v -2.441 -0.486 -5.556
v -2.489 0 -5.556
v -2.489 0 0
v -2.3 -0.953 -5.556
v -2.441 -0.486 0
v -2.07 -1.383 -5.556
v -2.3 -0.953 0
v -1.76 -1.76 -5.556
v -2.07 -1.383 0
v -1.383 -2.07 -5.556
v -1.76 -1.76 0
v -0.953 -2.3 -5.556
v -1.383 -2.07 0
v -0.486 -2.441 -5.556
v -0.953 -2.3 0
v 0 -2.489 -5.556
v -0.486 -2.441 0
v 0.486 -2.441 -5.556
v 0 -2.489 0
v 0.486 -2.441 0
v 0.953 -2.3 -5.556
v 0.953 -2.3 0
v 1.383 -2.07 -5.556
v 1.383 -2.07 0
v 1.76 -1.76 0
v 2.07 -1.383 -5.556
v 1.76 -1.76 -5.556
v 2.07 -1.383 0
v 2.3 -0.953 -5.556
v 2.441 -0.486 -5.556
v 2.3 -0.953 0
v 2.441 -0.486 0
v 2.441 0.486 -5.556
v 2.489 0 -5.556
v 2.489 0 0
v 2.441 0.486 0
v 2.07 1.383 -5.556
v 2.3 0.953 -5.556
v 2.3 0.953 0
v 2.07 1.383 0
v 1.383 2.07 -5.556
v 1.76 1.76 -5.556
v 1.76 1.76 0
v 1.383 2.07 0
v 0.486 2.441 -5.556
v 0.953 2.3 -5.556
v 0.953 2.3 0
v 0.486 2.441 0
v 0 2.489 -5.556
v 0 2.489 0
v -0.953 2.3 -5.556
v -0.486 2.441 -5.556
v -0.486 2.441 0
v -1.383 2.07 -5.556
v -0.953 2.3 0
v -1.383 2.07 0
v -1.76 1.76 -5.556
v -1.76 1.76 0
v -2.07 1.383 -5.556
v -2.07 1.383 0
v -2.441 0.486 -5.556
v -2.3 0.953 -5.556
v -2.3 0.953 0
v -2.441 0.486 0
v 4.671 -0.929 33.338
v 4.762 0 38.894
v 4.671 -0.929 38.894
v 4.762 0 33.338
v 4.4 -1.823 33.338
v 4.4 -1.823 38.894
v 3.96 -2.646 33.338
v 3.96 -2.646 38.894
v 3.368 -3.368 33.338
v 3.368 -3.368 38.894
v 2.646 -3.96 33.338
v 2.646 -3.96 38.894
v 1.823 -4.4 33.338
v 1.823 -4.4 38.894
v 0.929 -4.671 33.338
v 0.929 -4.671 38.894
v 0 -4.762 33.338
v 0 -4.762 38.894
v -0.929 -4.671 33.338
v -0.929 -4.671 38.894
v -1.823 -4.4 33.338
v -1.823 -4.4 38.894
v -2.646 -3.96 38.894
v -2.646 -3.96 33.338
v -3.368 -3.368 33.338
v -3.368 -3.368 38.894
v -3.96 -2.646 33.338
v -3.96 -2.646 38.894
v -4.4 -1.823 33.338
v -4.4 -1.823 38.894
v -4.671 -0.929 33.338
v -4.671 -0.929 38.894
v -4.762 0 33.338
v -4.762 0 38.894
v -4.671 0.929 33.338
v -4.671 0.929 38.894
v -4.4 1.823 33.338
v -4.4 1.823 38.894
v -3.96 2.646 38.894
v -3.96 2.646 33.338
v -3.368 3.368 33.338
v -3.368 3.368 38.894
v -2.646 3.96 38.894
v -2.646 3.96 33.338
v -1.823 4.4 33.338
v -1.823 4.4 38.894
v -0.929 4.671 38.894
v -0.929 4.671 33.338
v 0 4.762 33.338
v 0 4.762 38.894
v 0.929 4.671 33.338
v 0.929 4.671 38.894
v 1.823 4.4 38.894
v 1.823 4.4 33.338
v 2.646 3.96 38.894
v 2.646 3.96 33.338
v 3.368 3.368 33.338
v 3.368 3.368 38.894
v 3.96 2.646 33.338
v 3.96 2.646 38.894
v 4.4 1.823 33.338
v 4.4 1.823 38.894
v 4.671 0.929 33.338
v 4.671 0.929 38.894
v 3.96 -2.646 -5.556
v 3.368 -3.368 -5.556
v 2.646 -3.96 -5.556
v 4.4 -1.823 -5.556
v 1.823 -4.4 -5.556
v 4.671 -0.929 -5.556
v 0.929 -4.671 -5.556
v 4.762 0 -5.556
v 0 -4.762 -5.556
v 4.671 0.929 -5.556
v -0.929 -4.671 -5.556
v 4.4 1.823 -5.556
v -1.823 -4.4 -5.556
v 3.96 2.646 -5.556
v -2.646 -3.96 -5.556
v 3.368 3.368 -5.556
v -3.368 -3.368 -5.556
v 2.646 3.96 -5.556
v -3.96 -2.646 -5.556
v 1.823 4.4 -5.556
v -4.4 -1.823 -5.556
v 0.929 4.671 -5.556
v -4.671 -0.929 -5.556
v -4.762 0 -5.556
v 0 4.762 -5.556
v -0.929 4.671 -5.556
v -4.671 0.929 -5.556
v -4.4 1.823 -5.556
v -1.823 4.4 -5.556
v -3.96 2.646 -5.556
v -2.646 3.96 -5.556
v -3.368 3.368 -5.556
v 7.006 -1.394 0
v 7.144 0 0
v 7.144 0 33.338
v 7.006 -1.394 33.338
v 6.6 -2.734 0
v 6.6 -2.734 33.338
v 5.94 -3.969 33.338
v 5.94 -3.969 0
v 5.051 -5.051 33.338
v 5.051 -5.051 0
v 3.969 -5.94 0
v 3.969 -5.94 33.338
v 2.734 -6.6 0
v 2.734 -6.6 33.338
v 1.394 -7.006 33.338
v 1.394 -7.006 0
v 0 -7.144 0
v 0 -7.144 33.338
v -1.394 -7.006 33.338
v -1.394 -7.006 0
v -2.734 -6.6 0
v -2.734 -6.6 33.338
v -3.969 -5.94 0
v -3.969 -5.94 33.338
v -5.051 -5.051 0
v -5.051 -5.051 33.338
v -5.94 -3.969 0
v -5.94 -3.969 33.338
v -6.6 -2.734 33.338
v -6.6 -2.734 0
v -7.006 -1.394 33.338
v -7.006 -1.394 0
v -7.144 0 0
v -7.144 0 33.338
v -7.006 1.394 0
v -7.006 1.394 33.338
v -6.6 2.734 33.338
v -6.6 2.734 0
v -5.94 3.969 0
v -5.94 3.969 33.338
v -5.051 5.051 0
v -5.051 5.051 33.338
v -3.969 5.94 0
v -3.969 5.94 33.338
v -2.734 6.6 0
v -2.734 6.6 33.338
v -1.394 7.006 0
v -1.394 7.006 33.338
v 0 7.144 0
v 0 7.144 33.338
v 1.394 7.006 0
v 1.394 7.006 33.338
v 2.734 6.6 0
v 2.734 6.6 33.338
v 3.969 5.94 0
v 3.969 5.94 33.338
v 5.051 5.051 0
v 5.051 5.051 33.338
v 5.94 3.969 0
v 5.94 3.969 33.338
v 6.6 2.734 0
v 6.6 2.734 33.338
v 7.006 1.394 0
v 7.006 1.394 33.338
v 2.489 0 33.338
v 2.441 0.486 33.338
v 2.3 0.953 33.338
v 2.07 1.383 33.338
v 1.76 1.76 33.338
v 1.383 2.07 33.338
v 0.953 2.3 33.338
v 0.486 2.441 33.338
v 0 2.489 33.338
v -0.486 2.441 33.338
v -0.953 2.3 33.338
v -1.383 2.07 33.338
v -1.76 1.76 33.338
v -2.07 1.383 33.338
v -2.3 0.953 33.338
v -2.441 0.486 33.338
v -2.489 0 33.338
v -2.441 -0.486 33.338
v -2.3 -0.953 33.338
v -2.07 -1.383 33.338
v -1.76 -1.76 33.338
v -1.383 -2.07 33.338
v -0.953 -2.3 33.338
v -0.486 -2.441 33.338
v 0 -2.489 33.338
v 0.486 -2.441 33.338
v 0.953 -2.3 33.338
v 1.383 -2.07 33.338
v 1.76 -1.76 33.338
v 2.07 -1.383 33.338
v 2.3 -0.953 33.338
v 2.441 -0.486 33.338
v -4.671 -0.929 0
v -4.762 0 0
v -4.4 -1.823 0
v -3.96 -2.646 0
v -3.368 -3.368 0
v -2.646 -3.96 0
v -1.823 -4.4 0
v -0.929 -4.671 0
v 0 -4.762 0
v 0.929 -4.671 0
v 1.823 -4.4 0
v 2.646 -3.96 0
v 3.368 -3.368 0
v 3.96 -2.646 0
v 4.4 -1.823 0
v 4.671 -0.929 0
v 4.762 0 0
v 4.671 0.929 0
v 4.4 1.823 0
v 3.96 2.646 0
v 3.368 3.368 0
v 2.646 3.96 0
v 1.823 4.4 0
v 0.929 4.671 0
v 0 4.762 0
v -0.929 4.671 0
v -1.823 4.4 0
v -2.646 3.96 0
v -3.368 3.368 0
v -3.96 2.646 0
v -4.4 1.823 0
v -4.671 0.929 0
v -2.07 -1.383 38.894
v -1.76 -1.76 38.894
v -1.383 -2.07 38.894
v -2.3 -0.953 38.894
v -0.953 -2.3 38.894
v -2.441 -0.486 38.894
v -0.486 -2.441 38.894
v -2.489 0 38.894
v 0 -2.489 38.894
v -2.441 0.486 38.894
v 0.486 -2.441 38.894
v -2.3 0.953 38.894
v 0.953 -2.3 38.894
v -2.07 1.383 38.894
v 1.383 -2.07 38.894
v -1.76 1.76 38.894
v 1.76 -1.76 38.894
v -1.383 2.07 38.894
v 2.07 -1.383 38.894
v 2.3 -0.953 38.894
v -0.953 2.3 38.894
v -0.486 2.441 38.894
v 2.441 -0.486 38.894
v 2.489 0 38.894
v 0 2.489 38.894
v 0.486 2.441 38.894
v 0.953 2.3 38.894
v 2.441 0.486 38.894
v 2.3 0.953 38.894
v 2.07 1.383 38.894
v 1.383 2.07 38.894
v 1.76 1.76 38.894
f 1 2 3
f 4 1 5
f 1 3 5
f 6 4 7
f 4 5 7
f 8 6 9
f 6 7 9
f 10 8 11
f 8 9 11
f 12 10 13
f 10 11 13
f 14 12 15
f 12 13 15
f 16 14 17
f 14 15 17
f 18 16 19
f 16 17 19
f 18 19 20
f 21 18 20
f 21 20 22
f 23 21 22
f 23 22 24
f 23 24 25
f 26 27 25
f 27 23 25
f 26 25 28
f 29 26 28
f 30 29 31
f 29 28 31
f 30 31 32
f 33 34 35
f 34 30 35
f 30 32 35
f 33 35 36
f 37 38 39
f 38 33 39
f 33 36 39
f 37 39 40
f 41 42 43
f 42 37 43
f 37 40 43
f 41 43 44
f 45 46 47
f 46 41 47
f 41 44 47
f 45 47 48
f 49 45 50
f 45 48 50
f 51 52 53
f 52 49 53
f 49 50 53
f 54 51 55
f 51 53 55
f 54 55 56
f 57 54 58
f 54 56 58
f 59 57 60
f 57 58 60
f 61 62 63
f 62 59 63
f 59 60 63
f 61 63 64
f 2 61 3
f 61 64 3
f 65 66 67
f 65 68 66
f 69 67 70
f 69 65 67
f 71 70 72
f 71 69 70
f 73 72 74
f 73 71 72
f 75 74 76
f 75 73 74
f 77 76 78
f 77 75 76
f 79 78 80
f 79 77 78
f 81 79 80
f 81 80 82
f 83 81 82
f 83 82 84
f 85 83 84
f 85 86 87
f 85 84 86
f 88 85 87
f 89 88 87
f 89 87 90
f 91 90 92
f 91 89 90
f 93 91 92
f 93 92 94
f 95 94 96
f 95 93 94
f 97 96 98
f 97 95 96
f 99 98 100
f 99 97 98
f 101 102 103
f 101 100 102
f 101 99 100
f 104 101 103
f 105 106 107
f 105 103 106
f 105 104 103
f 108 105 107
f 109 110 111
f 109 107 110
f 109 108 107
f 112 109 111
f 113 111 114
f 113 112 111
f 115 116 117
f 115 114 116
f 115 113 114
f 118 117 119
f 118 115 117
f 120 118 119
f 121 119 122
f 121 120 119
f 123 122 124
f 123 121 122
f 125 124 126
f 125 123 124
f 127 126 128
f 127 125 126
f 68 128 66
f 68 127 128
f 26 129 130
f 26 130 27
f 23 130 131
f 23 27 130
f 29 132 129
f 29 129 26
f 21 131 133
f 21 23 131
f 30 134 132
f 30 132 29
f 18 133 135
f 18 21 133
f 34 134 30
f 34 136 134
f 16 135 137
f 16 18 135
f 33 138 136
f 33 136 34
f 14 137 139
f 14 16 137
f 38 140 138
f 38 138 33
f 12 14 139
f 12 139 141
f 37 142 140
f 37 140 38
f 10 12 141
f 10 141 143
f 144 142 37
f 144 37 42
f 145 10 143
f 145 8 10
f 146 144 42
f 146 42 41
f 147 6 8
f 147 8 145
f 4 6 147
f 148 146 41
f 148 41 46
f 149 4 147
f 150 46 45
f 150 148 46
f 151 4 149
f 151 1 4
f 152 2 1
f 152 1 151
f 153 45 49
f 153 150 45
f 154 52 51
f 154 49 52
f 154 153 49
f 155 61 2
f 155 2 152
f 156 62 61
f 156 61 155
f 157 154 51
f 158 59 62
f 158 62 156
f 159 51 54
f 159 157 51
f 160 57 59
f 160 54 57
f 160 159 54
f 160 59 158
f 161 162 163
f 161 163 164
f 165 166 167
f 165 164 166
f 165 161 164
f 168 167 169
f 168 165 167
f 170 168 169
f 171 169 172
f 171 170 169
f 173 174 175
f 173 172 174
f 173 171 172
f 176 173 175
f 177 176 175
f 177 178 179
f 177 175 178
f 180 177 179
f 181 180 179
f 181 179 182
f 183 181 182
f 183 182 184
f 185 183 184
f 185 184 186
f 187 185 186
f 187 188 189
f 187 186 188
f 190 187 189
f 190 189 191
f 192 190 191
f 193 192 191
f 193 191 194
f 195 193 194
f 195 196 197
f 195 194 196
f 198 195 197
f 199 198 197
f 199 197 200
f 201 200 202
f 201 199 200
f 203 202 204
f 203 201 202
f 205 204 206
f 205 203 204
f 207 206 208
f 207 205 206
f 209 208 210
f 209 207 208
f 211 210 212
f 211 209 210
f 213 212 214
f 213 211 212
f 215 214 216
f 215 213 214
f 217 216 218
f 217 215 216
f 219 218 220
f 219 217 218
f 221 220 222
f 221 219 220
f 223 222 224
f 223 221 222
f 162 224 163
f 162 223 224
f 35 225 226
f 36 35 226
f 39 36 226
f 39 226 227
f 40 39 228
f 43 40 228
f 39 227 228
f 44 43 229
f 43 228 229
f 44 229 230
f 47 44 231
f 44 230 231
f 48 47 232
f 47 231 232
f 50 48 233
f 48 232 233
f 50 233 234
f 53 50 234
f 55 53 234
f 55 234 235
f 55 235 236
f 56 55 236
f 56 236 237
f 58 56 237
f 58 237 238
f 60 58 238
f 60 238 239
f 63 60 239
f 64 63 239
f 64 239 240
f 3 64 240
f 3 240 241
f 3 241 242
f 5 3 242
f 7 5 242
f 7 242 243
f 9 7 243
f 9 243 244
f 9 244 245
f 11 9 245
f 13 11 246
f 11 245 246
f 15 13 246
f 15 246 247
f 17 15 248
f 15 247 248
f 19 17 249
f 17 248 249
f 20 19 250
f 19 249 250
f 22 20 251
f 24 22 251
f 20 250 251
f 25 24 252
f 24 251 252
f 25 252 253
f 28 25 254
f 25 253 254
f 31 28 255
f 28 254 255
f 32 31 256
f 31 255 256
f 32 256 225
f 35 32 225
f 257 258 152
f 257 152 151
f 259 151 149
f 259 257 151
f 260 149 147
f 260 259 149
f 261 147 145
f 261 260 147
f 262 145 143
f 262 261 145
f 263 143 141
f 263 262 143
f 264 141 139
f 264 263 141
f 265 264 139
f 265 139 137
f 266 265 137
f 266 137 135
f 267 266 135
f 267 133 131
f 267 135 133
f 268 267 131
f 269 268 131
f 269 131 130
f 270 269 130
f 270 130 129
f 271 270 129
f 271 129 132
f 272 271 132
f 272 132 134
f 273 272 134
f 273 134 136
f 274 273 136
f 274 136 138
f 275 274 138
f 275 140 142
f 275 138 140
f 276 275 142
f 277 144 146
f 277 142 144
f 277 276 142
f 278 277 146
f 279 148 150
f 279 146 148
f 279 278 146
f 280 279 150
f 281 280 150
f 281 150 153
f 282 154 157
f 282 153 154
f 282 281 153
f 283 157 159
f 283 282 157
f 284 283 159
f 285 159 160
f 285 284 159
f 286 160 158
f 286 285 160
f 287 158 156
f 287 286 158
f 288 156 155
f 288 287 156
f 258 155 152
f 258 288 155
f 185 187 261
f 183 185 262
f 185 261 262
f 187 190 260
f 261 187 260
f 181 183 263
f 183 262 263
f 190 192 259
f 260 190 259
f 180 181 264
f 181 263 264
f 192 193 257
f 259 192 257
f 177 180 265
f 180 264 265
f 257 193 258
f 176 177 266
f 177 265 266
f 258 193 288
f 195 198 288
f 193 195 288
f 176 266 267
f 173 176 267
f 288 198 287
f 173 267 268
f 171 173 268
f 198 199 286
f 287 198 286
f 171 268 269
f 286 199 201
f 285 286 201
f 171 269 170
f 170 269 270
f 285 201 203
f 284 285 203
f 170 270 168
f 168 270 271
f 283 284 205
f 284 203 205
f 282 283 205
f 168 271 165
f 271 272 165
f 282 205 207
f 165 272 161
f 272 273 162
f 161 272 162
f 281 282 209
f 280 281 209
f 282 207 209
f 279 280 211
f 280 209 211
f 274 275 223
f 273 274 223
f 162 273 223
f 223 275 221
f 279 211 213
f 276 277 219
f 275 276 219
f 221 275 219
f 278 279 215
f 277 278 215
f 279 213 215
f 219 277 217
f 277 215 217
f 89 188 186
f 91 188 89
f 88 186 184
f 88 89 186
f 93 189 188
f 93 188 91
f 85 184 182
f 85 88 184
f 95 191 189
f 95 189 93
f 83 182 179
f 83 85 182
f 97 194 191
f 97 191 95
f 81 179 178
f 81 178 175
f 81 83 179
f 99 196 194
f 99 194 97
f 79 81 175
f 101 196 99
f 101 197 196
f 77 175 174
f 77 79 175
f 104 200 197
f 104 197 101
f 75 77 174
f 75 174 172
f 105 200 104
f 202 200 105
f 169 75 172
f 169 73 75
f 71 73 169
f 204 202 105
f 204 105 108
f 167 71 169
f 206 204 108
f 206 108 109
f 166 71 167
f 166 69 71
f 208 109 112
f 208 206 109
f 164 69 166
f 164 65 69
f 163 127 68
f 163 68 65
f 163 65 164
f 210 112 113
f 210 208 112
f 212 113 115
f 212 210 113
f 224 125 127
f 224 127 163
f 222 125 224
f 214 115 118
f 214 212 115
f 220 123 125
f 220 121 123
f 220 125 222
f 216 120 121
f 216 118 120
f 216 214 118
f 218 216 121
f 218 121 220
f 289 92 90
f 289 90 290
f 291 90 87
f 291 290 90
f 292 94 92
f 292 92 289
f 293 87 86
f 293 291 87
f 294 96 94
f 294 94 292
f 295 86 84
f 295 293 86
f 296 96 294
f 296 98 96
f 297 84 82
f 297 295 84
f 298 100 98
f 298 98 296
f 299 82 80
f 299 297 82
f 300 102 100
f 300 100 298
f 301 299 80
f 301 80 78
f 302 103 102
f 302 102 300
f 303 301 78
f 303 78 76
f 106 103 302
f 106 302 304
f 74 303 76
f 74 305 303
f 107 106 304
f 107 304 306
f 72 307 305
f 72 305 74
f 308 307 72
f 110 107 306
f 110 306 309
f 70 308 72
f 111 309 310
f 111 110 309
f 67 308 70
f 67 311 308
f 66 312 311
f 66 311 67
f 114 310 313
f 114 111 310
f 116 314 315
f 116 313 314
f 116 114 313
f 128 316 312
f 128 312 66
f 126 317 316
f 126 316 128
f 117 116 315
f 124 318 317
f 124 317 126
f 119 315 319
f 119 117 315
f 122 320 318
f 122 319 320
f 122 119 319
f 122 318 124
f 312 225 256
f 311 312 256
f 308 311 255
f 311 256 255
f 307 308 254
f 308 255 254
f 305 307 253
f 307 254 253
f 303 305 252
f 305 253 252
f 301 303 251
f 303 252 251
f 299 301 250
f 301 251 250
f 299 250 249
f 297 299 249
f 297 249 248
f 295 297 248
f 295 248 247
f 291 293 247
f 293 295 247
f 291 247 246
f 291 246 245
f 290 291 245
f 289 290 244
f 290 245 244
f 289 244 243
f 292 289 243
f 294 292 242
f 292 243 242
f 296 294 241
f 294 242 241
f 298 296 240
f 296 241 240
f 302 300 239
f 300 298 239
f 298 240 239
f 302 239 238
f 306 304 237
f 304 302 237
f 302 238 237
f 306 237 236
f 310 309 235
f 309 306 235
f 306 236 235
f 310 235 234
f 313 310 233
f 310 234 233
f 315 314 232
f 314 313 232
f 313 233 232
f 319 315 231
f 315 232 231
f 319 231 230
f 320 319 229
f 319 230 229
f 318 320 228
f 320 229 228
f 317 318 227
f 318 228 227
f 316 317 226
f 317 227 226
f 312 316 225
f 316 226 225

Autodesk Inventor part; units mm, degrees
ref_plane "YZ Plane" through (0, 0, 0) normal (1, 0, 0) x (0, 1, 0)
ref_plane "XZ Plane" through (0, 0, 0) normal (0, 1, 0) x (-1, 0, 0)
sketch "Sketch1" plane through (0, 0, 0) normal (0, 0, 1) x (1, 0, 0)
  circle A0 centre (0, 0) radius 7.1437
  dimension "d0" = 14.2875
extrude "Extrusion1" add sketch "Sketch1" along normal blind 33.3375
ref_plane "Work Plane1" through (0, 0, 6.35) normal (0, 0, 1) x (1, 0, 0)
sketch "Sketch6" plane through (0, 0, 33.3375) normal (0, 0, 1) x (1, 0, 0)
  circle A0 centre (0, 0) radius 2.4892
  dimension "d28" = 4.9784
extrude "Extrusion3" cut sketch "Sketch6" against normal through all
sketch "Sketch7" plane through (0, 0, 33.3375) normal (0, 0, 1) x (1, 0, 0)
  circle A0 centre (0, 0) radius 4.7625
  circle A1 centre (0, 0) radius 2.4892
  dimension "d31" = 9.525
  dimension "d32" = 4.9784
extrude "Extrusion4" add sketch "Sketch7" along normal blind 5.5563
sketch "Sketch8" plane through (0, 0, 0) normal (0, 0, -1) x (-1, 0, 0)
  circle A0 centre (0, 0) radius 2.4892 projected
  circle A1 centre (0, 0) radius 4.7625 projected
extrude "Extrusion5" add sketch "Sketch8" along normal blind 5.5563
ref_plane "Work Plane2" through (0, 0, 16.6688) normal (0, 0, 1) x (1, 0, 0)
properties part number "RollerSpacer2(Bearing)"
